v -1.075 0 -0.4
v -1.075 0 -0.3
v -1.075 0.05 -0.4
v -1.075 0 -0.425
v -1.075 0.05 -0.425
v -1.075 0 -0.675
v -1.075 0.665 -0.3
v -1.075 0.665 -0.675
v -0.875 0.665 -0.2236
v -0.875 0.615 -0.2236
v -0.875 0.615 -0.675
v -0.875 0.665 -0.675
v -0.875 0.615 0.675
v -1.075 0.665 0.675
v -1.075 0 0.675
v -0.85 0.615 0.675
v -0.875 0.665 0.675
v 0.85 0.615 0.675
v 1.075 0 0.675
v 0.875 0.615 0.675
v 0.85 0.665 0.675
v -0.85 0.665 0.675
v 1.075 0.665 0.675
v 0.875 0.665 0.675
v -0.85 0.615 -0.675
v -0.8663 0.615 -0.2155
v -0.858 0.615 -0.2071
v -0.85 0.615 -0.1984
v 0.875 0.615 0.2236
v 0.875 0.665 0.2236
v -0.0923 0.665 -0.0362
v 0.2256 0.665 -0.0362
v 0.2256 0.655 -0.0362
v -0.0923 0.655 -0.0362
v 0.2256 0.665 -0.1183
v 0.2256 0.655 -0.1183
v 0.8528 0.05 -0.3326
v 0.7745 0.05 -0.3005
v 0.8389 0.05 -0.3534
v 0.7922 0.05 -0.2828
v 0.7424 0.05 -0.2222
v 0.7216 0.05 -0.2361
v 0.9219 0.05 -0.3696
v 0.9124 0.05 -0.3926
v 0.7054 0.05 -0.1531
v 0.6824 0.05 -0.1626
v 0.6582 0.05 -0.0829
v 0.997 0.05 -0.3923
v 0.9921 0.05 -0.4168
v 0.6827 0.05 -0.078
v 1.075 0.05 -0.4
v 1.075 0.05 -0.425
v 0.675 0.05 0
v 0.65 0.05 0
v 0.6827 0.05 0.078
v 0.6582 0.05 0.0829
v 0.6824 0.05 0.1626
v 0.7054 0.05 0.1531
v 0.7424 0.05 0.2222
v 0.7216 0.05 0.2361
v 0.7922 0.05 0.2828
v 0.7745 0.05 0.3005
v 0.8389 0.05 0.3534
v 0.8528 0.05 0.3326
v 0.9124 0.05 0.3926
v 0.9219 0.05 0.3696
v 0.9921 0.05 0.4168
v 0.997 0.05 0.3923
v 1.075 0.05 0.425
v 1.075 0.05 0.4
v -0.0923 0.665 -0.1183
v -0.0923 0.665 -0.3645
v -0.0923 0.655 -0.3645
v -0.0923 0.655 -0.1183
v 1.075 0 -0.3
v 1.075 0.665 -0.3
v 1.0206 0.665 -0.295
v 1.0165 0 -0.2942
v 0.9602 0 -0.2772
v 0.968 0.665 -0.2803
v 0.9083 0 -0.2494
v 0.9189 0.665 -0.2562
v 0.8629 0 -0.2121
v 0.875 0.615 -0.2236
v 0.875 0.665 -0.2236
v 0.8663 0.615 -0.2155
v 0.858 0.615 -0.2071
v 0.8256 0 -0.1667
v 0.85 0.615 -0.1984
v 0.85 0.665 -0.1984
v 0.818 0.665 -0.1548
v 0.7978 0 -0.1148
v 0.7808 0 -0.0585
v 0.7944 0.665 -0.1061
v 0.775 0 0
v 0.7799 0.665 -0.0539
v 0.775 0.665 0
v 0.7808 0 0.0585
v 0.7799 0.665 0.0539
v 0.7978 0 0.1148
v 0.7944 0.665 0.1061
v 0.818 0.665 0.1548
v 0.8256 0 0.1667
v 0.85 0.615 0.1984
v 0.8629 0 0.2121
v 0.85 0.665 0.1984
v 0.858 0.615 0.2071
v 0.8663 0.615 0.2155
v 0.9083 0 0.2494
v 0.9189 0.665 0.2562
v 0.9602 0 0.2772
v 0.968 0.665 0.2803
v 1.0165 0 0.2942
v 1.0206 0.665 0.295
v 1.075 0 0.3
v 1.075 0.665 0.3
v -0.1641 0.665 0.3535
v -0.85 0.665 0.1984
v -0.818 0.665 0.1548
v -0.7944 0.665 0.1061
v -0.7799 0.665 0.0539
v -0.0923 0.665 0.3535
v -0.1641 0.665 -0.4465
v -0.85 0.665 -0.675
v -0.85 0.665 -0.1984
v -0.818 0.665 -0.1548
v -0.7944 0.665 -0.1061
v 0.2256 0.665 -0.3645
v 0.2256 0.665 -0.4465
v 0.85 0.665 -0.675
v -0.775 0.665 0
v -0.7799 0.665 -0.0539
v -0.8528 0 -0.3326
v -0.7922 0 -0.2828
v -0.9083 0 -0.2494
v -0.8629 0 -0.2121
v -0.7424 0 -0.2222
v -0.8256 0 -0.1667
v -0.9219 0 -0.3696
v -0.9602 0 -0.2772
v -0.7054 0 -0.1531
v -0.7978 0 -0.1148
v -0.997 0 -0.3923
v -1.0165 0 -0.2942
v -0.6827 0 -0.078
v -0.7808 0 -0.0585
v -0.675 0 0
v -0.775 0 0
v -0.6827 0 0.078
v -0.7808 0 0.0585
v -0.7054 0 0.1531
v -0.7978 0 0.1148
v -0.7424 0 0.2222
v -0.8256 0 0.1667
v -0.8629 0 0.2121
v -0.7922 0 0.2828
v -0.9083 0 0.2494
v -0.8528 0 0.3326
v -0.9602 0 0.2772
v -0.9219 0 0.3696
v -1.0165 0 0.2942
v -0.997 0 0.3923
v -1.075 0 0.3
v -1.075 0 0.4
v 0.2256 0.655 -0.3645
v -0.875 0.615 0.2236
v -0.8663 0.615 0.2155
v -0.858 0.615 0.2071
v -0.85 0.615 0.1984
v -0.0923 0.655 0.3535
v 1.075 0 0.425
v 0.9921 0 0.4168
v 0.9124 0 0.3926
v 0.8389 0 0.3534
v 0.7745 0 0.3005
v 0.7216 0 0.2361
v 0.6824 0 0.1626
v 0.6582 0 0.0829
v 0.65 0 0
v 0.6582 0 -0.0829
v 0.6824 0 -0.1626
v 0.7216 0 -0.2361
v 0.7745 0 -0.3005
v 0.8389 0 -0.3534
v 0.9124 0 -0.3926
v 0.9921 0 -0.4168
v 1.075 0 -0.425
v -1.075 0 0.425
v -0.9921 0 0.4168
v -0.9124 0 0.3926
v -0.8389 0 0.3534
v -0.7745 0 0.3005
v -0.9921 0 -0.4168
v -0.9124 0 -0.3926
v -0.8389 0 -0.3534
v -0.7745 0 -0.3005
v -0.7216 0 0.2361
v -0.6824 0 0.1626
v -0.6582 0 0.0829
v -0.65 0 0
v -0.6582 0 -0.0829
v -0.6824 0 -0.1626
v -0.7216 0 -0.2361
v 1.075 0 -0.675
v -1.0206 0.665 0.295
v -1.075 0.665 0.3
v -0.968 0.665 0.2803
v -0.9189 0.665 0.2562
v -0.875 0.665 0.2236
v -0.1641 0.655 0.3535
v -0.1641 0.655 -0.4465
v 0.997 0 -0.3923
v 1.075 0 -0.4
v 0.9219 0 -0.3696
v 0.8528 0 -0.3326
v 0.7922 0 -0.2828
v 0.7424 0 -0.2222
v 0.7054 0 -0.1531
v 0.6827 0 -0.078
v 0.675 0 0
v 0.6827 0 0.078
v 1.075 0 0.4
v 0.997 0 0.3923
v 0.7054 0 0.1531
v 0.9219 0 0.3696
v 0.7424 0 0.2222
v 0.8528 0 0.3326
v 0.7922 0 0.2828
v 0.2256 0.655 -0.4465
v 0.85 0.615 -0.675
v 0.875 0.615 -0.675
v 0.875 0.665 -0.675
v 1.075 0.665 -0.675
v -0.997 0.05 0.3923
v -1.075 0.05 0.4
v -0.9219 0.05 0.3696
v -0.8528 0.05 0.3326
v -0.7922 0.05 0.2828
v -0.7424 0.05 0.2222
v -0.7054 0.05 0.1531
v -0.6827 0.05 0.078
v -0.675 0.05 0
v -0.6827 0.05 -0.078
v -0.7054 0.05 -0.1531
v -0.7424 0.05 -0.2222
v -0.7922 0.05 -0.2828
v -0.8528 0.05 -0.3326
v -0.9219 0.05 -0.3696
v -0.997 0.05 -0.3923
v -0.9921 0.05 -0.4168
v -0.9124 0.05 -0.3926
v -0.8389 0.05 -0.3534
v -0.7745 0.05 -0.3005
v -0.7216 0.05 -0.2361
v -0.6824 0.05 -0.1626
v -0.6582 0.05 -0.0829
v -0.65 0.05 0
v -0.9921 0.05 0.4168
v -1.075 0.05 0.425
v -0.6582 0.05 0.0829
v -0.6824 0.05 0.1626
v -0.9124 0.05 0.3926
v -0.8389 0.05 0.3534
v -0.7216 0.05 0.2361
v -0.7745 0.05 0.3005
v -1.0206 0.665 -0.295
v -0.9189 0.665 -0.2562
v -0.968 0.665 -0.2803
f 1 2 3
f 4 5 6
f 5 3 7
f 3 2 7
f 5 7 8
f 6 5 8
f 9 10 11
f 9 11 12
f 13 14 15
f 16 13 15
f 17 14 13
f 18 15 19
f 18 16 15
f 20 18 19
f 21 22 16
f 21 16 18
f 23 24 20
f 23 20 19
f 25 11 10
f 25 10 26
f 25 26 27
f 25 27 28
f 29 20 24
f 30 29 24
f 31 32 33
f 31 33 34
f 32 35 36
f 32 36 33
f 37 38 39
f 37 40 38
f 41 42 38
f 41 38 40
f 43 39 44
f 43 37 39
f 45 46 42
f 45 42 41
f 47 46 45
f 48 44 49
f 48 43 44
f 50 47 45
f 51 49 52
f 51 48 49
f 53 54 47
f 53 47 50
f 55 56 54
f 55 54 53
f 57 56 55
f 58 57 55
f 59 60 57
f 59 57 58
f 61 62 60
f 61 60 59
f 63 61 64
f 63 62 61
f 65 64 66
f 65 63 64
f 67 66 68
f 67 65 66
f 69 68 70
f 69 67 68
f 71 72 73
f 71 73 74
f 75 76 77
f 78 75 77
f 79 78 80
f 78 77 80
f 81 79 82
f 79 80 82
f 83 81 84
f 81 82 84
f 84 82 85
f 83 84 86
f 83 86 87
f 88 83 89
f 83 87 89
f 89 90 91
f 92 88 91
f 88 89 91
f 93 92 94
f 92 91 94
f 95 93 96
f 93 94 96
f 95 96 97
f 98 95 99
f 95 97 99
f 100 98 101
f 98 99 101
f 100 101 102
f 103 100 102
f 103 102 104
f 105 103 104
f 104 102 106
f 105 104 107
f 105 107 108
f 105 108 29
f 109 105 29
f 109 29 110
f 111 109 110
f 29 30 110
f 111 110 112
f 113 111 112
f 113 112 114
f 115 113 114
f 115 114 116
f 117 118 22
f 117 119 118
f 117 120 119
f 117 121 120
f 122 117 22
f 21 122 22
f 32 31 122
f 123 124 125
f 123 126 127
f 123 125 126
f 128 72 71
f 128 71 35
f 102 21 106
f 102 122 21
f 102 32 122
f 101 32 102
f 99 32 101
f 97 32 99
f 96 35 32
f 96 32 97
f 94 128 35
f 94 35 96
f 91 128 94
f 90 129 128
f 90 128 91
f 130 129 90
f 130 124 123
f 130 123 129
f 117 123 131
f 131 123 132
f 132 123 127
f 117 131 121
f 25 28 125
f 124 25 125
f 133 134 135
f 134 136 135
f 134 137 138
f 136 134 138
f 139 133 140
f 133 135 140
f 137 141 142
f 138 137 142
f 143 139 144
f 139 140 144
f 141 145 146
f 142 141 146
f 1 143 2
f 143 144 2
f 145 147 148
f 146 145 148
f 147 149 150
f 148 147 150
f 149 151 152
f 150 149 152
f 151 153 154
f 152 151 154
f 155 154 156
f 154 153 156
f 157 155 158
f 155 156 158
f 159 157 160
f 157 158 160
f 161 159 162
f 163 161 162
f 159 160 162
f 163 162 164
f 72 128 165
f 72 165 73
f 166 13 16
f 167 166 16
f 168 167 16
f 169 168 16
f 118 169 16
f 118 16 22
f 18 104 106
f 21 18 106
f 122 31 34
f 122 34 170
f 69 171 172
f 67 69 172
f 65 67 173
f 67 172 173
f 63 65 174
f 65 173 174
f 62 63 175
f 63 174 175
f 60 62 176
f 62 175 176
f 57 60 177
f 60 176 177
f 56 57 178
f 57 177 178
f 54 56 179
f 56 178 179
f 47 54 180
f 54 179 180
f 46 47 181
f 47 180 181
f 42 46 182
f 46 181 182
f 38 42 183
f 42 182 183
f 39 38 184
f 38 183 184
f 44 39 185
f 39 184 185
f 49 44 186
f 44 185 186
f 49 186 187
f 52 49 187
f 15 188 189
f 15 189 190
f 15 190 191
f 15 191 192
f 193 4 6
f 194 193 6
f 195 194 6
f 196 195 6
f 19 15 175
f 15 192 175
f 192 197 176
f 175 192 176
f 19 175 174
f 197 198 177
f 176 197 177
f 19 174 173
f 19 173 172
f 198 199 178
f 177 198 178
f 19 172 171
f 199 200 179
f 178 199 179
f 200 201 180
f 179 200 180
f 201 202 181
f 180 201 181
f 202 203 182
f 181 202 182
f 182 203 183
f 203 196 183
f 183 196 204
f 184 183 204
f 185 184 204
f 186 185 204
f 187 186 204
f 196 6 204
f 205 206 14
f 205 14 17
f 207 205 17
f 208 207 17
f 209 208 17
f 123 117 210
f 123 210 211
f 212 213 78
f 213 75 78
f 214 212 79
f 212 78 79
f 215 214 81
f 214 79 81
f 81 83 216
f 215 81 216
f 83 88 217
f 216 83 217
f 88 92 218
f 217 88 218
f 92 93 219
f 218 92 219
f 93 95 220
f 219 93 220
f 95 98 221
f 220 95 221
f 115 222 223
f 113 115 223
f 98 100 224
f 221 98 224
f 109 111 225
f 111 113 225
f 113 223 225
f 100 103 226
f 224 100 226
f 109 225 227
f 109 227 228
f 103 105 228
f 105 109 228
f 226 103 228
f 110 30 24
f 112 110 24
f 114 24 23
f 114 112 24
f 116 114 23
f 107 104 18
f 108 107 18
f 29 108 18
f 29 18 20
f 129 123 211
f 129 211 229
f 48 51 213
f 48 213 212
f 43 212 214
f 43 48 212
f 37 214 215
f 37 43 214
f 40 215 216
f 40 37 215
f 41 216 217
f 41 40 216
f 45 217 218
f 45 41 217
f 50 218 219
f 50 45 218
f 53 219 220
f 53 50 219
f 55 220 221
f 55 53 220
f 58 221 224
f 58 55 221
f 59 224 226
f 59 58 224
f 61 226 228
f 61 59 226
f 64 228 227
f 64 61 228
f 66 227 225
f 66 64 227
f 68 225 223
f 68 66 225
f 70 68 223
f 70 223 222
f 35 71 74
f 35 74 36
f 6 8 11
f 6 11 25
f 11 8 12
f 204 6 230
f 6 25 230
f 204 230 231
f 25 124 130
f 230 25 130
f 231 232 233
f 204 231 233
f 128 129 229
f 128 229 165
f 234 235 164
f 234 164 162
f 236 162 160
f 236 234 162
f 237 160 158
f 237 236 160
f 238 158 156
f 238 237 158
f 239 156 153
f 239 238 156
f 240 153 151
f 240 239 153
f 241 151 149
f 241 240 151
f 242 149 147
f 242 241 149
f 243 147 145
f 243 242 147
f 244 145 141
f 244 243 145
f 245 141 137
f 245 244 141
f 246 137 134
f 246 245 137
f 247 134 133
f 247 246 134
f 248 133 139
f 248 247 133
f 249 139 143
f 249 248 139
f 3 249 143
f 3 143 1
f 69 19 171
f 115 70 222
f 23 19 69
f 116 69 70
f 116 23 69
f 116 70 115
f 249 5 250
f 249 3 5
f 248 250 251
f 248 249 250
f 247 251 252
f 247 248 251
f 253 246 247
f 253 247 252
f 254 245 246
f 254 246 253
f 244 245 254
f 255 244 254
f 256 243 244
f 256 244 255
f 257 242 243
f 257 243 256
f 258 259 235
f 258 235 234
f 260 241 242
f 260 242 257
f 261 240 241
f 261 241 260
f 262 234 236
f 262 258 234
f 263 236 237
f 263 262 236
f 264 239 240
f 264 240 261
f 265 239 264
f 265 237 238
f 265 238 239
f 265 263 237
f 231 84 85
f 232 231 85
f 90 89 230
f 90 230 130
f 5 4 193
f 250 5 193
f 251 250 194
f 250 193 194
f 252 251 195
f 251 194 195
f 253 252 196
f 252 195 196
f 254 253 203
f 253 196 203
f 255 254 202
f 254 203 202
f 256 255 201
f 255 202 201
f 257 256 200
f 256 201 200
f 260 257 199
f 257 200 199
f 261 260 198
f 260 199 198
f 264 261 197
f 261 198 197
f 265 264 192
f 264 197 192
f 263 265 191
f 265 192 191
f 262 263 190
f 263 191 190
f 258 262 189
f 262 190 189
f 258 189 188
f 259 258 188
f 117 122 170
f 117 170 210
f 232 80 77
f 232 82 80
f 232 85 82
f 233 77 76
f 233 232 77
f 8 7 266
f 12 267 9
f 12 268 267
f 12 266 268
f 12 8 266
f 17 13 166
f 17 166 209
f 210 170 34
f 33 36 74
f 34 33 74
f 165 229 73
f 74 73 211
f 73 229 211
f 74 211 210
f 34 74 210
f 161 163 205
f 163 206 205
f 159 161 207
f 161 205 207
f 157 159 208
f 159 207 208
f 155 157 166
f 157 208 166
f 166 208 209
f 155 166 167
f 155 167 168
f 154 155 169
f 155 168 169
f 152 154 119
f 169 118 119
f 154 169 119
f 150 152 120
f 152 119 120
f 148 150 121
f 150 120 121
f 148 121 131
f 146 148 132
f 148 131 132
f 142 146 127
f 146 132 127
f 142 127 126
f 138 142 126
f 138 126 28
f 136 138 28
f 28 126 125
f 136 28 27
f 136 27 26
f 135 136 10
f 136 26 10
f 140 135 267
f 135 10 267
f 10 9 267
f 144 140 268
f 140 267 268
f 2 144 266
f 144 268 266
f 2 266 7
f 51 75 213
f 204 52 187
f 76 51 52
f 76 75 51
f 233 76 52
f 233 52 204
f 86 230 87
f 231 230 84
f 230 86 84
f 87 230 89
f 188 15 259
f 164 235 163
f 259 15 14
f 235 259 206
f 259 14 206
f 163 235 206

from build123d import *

# Parameters (mm, degrees)
SKETCH1_W                  = 2.15
SKETCH1_H                  = 1.35
BOSS_EXTRUDE1_DEPTH        = 0.665
SKETCH2_W                  = 0.025
SKETCH2_H                  = 0.05
CUT_EXTRUDE1_DEPTH         = 2.849418828
SKETCH3_W                  = 0.025
SKETCH3_H                  = 0.05
CUT_EXTRUDE2_DEPTH         = 2.849418828
CUT_EXTRUDE3_DEPTH         = 0.05
BOSS_EXTRUDE2_DEPTH        = 0.05
CUT_EXTRUDE4_DEPTH         = 0.05
BOSS_EXTRUDE3_DEPTH        = 0.05
F_0_6_0_6_DIAMETER_HOLE1_D = 0.6
CUT_EXTRUDE5_DEPTH         = 0.01


with BuildPart() as part:
    # Sketch1 → Boss-Extrude1 (new body)
    with BuildSketch(Plane(origin=(0, 0.665, 0), x_dir=(1, 0, 0), z_dir=(0, 1, 0))):
        Rectangle(SKETCH1_W, SKETCH1_H)
    extrude(amount=-BOSS_EXTRUDE1_DEPTH)

    # Sketch2 → Cut-Extrude1 (cut, through all)
    with BuildSketch(Plane.XY.offset(0.675)):
        with Locations((0.8625, 0.64)):
            Rectangle(SKETCH2_W, SKETCH2_H)
    extrude(amount=-CUT_EXTRUDE1_DEPTH, mode=Mode.SUBTRACT)

    # Sketch3 → Cut-Extrude2 (cut, through all)
    with BuildSketch(Plane.XY.offset(0.675)):
        with Locations((-0.8625, 0.64)):
            Rectangle(SKETCH3_W, SKETCH3_H)
    extrude(amount=-CUT_EXTRUDE2_DEPTH, mode=Mode.SUBTRACT)

    # Sketch4 → Cut-Extrude3 (cut)
    with BuildSketch(Plane.XZ):
        with BuildLine():
            Line((-1.075, 0.425), (-1.075, -0.425))
            ThreePointArc((-1.075, -0.425), (-0.65, 0), (-1.075, 0.425))
        make_face()
    extrude(amount=-CUT_EXTRUDE3_DEPTH, mode=Mode.SUBTRACT)

    # Sketch5 → Boss-Extrude2 (add)
    with BuildSketch(Plane.XZ.offset(-0.05)):
        with BuildLine():
            Line((-1.075, -0.4), (-1.075, 0.4))
            ThreePointArc((-1.075, 0.4), (-0.675, 0), (-1.075, -0.4))
        make_face()
    extrude(amount=BOSS_EXTRUDE2_DEPTH)

    # Sketch6 → Cut-Extrude4 (cut)
    with BuildSketch(Plane.XZ):
        with BuildLine():
            Line((1.075, -0.425), (1.075, 0.425))
            ThreePointArc((1.075, 0.425), (0.65, 0), (1.075, -0.425))
        make_face()
    extrude(amount=-CUT_EXTRUDE4_DEPTH, mode=Mode.SUBTRACT)

    # Sketch7 → Boss-Extrude3 (add)
    with BuildSketch(Plane.XZ.offset(-0.05)):
        with BuildLine():
            Line((1.075, 0.4), (1.075, -0.4))
            ThreePointArc((1.075, -0.4), (0.675, 0), (1.075, 0.4))
        make_face()
    extrude(amount=BOSS_EXTRUDE3_DEPTH)

    # Ø0.6 (0.6) Diameter Hole1 (through all)
    with Locations(Plane(origin=(0, 0, 0), x_dir=(-1, 0, 0), z_dir=(0, -1, 0))):
        with Locations((1.075, 0), (-1.075, 0)):
            Hole(F_0_6_0_6_DIAMETER_HOLE1_D / 2)

    # Sketch10 → Cut-Extrude5 (cut)
    with BuildSketch(Plane(origin=(0, 0.665, 0), x_dir=(1, 0, 0), z_dir=(0, 1, 0))):
        Polygon((-0.164102564, 0.446504379), (0.225641026, 0.446504379), (0.225641026, 0.364453097), (-0.092307692, 0.364453097), (-0.092307692, 0.118299251), (0.225641026, 0.118299251), (0.225641026, 0.036247969), (-0.092307692, 0.036247969), (-0.092307692, -0.353495621), (-0.164102564, -0.353495621), align=None)
    extrude(amount=-CUT_EXTRUDE5_DEPTH, mode=Mode.SUBTRACT)


solid = part.part
